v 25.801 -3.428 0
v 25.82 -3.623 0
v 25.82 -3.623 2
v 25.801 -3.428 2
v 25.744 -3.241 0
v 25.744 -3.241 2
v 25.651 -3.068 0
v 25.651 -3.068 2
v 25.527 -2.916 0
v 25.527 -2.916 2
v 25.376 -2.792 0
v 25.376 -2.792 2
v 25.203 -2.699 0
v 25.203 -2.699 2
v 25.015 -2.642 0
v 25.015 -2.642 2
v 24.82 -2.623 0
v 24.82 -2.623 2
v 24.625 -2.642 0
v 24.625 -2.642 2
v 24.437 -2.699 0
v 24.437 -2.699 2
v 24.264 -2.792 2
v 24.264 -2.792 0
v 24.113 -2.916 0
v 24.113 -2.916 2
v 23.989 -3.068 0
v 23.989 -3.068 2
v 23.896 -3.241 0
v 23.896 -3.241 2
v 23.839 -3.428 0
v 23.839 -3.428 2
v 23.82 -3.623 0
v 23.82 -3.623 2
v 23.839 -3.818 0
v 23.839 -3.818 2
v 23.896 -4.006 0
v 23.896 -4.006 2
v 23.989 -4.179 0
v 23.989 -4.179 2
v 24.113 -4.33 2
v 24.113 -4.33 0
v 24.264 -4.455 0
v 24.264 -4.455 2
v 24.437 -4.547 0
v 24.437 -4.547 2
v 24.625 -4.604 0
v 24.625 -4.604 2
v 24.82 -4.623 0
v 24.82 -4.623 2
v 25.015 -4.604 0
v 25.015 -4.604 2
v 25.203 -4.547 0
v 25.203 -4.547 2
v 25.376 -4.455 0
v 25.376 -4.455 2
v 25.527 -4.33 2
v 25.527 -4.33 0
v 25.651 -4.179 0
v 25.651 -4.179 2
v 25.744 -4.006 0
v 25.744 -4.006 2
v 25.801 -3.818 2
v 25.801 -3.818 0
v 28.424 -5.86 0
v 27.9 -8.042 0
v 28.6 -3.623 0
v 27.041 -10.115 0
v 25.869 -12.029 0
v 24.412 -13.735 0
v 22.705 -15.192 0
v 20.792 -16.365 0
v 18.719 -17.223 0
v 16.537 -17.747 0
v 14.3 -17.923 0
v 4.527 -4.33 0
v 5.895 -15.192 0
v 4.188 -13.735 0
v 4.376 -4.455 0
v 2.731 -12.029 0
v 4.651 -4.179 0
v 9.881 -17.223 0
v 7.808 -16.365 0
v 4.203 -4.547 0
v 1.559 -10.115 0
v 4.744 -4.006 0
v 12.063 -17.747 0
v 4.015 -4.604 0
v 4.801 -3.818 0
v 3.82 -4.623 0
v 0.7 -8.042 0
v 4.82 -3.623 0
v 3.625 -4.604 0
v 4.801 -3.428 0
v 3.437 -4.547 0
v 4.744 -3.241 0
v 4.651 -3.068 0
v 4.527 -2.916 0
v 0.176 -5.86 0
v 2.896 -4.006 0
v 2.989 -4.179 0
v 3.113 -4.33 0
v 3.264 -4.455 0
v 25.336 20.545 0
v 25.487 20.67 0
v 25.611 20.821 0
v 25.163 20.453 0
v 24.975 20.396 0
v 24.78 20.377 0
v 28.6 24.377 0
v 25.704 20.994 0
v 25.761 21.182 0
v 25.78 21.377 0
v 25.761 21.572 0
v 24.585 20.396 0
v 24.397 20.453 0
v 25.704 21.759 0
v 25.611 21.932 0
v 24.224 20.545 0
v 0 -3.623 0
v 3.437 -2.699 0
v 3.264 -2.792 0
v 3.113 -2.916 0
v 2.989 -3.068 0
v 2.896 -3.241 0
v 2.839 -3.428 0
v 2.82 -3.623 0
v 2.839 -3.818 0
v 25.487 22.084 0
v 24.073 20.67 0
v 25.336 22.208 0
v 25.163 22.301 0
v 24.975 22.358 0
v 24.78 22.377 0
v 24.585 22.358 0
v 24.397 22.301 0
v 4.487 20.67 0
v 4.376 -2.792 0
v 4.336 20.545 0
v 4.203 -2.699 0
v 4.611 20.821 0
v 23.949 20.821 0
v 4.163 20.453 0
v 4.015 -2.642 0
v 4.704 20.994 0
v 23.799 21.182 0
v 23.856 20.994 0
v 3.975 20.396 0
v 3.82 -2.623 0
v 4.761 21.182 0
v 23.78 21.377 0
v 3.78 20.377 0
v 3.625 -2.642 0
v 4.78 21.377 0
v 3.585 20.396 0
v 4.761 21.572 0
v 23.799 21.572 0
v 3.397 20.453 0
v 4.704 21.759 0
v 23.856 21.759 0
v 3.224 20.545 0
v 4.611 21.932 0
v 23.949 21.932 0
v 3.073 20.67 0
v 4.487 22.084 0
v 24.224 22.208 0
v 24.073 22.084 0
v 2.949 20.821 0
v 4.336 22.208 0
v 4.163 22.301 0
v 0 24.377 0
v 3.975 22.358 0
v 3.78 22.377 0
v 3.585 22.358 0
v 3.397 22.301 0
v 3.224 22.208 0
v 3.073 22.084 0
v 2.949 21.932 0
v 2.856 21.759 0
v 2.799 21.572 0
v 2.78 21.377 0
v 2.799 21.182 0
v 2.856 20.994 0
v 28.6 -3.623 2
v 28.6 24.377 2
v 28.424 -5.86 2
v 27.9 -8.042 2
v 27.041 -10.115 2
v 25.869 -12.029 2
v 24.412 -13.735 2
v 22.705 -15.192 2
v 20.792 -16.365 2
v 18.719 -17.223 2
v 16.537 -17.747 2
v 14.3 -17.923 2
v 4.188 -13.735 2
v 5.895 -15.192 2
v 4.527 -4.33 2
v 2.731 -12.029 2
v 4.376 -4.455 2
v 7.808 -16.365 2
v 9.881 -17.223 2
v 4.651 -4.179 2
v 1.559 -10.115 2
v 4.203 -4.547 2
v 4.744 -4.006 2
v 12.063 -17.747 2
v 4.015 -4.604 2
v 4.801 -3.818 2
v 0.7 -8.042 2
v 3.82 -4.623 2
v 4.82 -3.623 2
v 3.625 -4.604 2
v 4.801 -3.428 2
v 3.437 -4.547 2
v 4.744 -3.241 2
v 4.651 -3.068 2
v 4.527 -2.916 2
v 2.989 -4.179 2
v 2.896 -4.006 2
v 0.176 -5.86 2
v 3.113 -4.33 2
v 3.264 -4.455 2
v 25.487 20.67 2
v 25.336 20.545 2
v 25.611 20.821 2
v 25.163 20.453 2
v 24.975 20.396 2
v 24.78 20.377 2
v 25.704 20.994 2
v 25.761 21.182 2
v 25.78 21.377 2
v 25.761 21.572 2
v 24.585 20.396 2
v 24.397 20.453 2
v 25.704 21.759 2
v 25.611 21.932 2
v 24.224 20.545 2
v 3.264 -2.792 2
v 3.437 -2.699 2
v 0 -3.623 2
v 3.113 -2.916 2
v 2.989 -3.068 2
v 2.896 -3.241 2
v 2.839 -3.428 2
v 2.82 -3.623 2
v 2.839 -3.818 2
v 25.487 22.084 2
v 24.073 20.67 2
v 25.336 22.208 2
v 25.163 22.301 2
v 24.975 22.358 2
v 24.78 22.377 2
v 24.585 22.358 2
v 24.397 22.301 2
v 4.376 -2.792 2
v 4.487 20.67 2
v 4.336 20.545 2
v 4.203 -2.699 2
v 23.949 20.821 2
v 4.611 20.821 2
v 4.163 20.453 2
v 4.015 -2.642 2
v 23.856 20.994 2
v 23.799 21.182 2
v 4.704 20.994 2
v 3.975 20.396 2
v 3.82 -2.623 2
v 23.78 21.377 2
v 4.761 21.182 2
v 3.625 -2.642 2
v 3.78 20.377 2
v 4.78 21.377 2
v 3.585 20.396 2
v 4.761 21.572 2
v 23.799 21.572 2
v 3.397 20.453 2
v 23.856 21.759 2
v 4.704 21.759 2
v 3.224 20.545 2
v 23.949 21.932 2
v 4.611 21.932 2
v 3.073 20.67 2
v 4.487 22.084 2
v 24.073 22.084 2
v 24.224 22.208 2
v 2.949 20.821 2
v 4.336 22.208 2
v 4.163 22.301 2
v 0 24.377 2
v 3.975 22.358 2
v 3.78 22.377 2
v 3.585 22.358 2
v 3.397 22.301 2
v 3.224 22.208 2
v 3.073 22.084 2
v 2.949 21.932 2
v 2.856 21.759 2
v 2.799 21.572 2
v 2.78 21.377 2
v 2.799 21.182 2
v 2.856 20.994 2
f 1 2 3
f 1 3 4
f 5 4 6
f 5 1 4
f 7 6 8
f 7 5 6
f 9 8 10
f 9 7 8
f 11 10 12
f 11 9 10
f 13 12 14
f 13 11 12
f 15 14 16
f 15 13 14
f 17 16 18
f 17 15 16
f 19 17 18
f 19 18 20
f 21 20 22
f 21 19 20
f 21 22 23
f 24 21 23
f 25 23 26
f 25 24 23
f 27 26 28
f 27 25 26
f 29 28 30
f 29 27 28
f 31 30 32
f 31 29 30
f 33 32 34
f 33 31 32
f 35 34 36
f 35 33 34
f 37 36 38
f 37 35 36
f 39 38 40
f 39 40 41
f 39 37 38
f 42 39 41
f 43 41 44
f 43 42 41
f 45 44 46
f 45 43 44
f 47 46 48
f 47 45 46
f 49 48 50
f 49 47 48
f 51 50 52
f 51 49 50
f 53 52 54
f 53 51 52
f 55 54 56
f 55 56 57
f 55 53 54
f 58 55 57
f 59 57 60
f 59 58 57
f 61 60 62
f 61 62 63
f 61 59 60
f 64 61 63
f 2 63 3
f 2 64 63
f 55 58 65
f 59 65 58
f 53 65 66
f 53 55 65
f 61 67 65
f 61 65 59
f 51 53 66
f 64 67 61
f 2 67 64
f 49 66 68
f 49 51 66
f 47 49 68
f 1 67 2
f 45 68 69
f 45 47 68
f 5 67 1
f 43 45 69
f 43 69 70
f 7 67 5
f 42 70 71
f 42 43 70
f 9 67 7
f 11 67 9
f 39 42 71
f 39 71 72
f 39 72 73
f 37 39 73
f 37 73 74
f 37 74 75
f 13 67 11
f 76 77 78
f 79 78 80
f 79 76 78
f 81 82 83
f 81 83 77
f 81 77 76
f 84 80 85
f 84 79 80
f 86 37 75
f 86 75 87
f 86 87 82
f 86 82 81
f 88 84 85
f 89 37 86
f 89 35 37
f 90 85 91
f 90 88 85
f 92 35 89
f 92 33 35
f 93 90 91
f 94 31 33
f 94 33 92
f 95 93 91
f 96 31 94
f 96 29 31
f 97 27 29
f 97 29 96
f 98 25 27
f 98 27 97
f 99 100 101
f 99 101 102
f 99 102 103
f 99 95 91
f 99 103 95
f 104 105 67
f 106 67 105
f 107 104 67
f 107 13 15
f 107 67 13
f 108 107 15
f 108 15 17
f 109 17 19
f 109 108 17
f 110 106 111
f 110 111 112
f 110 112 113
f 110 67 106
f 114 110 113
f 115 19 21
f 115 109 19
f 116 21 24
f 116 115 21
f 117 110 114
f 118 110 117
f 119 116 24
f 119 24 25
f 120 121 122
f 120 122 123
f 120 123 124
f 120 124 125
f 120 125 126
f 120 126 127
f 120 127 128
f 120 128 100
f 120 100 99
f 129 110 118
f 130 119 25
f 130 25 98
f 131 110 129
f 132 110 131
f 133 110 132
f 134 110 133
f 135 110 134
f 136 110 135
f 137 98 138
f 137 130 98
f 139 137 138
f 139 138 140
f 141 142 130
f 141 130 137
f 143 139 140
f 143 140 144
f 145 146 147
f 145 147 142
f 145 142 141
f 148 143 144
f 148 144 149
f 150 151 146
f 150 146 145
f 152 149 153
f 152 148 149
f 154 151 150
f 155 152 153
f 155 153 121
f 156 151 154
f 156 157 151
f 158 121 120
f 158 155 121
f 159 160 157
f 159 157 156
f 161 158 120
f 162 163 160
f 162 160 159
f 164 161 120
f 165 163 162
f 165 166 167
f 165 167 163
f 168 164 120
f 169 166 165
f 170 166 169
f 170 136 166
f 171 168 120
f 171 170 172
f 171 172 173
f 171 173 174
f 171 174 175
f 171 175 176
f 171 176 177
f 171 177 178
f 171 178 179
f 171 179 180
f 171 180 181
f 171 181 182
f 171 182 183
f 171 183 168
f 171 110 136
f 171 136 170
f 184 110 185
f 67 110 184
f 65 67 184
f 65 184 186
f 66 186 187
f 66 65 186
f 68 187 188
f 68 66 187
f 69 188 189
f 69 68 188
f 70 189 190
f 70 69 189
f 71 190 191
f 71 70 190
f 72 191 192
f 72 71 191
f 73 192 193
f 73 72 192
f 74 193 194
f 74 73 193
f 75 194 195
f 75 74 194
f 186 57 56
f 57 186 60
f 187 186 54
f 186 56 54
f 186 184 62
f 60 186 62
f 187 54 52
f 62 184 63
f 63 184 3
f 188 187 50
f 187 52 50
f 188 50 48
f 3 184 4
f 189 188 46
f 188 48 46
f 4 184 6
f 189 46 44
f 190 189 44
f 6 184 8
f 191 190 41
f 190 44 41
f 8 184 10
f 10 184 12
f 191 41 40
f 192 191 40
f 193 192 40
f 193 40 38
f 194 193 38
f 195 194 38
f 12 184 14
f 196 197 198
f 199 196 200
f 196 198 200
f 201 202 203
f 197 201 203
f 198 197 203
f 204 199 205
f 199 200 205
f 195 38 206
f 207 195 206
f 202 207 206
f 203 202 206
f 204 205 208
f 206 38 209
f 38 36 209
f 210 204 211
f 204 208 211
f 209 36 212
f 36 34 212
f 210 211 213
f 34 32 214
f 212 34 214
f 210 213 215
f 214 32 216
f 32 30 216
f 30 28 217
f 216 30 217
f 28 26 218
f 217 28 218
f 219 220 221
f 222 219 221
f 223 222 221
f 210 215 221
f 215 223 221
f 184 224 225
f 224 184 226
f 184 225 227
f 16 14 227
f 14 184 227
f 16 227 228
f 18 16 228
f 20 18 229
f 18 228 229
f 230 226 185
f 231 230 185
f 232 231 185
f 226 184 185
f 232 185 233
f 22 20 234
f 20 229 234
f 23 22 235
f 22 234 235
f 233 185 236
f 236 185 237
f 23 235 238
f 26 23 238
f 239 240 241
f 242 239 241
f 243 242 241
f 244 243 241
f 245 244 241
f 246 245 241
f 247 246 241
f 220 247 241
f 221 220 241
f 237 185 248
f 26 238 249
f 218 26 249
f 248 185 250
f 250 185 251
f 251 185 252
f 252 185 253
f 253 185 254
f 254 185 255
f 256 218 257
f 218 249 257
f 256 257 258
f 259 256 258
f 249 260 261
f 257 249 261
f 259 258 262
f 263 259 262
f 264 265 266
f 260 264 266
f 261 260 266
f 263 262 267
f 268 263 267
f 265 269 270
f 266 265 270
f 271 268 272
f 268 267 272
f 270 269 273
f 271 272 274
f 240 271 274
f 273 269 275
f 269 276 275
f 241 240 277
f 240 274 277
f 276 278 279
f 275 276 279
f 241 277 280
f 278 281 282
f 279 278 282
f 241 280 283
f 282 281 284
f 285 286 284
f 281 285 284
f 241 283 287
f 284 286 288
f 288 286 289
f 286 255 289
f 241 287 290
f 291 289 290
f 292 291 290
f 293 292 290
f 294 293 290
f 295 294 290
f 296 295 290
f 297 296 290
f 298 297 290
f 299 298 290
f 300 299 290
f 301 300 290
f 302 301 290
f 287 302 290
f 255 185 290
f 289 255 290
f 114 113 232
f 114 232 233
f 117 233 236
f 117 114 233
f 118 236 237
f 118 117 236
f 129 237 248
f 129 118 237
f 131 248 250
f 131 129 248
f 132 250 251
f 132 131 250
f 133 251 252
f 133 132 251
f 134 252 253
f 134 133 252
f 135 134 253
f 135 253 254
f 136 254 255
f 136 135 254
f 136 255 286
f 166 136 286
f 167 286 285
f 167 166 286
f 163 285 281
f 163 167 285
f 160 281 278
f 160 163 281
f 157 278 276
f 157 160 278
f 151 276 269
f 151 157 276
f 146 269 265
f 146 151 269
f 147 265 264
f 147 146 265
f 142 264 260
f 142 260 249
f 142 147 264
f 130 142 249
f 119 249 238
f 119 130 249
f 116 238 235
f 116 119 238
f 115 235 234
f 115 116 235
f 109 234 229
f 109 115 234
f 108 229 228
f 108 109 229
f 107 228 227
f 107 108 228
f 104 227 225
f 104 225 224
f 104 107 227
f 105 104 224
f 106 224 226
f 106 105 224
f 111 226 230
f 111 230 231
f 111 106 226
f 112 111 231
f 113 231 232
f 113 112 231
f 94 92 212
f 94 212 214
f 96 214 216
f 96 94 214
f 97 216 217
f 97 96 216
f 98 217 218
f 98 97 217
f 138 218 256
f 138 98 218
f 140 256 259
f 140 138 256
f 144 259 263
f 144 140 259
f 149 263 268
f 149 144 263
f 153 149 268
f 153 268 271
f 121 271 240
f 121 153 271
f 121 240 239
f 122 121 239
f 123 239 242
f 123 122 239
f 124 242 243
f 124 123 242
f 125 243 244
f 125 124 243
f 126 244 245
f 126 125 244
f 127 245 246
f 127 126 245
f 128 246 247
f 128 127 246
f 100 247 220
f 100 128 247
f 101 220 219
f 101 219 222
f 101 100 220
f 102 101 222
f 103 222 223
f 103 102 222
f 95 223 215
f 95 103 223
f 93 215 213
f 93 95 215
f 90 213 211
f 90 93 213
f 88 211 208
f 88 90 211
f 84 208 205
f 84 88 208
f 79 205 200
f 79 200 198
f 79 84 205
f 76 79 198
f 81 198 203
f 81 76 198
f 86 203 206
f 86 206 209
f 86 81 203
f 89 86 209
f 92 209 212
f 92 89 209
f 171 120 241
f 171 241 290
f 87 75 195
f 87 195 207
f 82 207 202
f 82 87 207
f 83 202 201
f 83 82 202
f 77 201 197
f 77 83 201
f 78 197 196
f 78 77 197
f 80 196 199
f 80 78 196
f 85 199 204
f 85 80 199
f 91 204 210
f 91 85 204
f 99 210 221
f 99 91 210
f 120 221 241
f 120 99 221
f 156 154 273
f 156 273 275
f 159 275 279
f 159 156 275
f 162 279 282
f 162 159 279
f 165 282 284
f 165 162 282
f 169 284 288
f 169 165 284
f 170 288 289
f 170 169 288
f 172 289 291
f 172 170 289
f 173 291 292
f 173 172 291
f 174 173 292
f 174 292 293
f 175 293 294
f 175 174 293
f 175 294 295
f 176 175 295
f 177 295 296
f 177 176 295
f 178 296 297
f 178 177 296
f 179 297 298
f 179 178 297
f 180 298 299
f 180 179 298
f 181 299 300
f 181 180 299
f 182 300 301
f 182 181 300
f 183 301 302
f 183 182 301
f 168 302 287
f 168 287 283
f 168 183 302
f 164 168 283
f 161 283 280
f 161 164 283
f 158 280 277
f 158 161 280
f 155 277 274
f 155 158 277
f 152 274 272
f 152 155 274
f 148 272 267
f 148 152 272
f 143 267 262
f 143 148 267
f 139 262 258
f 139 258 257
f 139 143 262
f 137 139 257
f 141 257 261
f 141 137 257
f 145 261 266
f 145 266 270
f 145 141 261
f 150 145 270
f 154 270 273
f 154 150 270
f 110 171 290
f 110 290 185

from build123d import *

# Parameters (mm, degrees)
SKETCH_1_R      = 1
EXTRUDE_1_DEPTH = 2


with BuildPart() as part:
    # 草图1 → 凸台-拉伸1 (new body)
    with BuildSketch(Plane.XY):
        with BuildLine():
            Line((0, 24.376794113), (28.6, 24.376794113))
            Line((28.6, 24.376794113), (28.6, -3.62321671))
            ThreePointArc((28.6, -3.62321671), (24.411626971, -13.734843681), (14.3, -17.92321671))
            ThreePointArc((14.3, -17.92321671), (4.188373029, -13.734843681), (0, -3.62321671))
            Line((0, -3.62321671), (0, 24.376794113))
        make_face()
        with Locations((24.78, 21.376794113)):
            Circle(SKETCH_1_R, mode=Mode.SUBTRACT)
        with Locations((3.78, 21.376794113)):
            Circle(SKETCH_1_R, mode=Mode.SUBTRACT)
        with Locations((3.82, -3.623205887)):
            Circle(SKETCH_1_R, mode=Mode.SUBTRACT)
        with Locations((24.82, -3.623205887)):
            Circle(SKETCH_1_R, mode=Mode.SUBTRACT)
    extrude(amount=EXTRUDE_1_DEPTH)


solid = part.part
